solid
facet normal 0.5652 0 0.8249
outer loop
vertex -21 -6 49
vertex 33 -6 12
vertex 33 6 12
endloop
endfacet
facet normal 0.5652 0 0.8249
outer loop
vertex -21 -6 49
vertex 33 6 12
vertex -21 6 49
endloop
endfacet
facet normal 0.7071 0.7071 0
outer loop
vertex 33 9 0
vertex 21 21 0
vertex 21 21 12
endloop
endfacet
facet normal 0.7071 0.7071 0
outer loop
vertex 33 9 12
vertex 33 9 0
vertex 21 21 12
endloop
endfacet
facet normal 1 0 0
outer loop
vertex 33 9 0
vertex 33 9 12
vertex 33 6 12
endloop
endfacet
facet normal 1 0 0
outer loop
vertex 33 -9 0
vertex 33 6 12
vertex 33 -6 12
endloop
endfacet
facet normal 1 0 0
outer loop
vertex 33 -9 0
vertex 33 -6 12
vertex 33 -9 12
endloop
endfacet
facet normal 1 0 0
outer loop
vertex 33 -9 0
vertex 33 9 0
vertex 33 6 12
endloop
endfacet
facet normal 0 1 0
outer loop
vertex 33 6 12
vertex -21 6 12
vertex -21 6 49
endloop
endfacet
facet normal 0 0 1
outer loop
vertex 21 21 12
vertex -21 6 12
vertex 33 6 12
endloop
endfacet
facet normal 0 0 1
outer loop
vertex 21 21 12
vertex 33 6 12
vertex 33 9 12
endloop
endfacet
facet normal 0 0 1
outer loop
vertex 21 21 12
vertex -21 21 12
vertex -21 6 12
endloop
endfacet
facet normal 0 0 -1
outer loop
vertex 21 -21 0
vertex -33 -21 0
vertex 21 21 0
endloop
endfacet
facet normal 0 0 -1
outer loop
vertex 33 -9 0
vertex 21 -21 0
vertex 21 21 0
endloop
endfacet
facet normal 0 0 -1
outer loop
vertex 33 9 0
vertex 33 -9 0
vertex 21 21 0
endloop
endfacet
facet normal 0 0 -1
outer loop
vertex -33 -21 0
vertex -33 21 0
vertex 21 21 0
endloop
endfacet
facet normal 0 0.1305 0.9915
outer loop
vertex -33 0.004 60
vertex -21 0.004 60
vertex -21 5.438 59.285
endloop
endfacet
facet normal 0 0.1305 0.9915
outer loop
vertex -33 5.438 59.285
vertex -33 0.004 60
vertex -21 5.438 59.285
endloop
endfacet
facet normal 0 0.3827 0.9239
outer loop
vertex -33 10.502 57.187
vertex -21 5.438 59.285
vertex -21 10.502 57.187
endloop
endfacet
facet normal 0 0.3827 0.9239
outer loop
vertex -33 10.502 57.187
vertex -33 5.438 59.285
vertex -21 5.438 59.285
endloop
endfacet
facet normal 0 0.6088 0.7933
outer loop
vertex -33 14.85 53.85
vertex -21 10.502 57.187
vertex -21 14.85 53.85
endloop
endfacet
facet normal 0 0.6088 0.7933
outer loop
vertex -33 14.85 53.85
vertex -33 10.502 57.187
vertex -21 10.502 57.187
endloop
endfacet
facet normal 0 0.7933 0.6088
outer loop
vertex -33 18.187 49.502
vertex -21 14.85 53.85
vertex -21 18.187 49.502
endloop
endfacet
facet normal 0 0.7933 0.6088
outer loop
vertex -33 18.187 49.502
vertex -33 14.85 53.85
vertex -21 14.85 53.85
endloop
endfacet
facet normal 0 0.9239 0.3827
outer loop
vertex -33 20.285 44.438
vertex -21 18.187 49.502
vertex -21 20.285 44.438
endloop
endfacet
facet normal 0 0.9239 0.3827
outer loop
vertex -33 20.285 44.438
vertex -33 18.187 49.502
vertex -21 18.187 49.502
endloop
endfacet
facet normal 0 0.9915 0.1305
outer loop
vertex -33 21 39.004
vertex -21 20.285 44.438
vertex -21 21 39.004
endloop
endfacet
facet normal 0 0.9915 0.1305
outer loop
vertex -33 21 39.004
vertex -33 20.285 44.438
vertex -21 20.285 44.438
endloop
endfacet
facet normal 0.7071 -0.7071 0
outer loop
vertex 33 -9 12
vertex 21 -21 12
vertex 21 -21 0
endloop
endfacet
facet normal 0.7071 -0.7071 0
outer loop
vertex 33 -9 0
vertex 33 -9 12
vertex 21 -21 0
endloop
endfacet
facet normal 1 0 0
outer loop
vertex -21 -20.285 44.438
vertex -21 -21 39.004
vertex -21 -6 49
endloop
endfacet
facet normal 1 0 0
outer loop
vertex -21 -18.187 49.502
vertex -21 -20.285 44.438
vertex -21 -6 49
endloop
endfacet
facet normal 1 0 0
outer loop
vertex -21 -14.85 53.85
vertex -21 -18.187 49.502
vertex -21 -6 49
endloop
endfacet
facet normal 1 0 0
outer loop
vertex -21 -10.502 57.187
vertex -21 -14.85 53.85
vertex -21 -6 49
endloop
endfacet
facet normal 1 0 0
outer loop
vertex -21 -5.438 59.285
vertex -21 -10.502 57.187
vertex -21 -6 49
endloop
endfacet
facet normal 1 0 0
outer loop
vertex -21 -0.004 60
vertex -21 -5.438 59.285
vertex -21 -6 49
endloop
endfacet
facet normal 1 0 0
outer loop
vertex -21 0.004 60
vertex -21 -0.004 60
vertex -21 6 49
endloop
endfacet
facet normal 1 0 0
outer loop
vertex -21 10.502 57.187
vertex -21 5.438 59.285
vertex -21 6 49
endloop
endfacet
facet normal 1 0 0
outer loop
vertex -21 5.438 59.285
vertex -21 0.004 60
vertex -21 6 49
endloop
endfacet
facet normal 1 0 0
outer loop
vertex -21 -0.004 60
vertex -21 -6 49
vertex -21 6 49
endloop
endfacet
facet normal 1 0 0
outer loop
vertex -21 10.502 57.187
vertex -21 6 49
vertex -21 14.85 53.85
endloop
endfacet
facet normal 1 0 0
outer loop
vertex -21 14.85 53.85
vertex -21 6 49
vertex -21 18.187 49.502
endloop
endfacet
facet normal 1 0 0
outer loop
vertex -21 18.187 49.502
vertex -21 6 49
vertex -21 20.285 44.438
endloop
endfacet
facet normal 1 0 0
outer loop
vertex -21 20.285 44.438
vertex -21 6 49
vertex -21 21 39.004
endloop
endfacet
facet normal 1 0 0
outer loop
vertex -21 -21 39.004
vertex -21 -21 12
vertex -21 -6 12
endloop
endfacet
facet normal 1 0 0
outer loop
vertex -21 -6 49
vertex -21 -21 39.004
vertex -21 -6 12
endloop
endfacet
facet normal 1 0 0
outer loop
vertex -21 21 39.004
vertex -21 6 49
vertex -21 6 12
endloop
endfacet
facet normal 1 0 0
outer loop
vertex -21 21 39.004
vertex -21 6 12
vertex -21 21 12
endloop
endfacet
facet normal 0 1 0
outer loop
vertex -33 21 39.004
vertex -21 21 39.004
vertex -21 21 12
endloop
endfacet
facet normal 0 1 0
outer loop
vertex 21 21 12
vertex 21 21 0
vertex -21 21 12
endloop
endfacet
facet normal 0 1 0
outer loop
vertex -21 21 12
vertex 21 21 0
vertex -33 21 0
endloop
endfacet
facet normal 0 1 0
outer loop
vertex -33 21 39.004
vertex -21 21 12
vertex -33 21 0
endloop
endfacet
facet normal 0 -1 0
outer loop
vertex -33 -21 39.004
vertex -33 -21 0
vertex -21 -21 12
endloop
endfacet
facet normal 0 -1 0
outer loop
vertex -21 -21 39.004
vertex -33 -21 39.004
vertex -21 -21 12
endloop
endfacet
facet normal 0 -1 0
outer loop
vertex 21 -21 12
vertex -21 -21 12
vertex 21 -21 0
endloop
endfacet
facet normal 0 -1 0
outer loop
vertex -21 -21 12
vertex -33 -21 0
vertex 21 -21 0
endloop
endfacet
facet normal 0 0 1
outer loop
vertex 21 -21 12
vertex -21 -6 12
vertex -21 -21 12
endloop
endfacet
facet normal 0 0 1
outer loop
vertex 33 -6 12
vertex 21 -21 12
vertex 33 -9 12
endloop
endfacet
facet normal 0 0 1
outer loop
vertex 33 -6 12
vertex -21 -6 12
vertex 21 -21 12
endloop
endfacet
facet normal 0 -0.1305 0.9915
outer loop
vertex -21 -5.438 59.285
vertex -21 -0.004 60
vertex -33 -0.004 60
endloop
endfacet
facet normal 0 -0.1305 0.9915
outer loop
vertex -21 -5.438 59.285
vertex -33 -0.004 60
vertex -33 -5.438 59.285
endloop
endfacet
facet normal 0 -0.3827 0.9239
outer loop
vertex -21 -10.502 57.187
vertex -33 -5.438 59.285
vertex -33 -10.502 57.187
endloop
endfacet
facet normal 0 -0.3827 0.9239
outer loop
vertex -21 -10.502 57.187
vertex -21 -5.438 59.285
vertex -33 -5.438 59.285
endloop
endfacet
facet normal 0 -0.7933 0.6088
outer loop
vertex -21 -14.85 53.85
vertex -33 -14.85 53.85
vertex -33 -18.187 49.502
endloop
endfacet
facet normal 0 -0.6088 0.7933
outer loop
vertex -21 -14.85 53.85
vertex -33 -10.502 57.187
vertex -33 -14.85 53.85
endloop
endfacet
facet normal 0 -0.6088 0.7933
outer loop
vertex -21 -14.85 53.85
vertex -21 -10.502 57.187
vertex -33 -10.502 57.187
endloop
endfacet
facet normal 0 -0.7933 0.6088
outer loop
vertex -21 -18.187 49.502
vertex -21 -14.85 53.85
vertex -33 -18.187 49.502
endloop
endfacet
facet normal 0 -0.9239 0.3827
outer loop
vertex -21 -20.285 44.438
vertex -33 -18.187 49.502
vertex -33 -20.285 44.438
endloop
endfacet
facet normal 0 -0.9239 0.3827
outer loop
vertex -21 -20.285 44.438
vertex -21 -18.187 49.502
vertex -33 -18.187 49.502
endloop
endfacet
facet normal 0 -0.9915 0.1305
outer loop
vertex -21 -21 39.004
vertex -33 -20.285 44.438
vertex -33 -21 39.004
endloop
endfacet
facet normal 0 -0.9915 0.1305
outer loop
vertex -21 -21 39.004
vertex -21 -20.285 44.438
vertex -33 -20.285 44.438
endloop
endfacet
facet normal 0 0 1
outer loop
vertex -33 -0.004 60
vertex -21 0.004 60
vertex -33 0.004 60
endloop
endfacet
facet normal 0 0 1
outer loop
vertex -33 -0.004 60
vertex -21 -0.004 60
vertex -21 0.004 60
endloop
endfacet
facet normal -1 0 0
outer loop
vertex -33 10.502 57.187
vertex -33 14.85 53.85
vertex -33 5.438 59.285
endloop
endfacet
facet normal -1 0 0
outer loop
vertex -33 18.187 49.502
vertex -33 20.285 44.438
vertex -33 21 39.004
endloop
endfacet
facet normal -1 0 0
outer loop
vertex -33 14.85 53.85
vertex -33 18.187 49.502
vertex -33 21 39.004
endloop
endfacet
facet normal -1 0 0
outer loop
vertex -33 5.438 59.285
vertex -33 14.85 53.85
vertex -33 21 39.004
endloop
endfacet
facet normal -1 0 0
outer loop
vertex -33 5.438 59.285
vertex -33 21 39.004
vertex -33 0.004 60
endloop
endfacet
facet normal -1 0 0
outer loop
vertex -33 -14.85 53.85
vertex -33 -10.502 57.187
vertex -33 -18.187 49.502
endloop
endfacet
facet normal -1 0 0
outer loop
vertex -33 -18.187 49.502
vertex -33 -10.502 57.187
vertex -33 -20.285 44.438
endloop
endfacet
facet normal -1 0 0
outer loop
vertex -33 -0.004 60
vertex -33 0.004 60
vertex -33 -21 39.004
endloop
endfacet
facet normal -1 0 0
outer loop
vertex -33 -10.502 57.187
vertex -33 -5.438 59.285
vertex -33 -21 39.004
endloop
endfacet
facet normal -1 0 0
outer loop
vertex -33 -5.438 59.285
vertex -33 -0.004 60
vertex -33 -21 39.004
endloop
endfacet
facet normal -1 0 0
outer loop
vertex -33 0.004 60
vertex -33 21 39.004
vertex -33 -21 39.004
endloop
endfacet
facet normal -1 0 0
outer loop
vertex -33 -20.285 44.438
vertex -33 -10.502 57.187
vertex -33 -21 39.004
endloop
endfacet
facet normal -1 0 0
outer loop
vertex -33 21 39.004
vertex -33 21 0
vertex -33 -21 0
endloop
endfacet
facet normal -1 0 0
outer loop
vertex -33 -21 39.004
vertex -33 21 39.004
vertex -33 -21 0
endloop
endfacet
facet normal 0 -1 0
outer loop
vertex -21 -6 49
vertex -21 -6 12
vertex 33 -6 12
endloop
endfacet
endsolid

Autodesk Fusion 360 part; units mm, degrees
sketch "Sketch1" plane through (0, 0, 0) normal (0, 0, 1) x (1, 0, 0)
  line L0 (33, -21) -> (-33, -21)
  line L1 (-33, -21) -> (-33, 21)
  line L2 (-33, 21) -> (33, 21)
  line L3 (33, 21) -> (33, -21)
  line L4 (33, -21) -> (-33, 21) construction
  line L5 (-33, -21) -> (33, 21) construction
  dimension "d1" = 66
  dimension "d2" = 42
extrude "Extrude1" add sketch "Sketch1" along normal blind 12
chamfer "Chamfer1" distance 12 angle 45 2 edges at (33, -21, 6) (33, 21, 6)
sketch "Sketch2" plane through (0, 0, 12) normal (0, 0, 1) x (-1, 0, 0)
  line L0 (-33, -9) -> (-21, -21)
  line L1 (-21, -21) -> (33, -21)
  line L2 (33, -21) -> (33, 21)
  line L3 (33, 21) -> (-21, 21)
  line L4 (-21, 21) -> (-33, 9)
  line L5 (-33, 9) -> (-33, -9)
  line L6 (33, 21) -> (21, 21)
  line L7 (21, 21) -> (21, -21)
  line L8 (21, -21) -> (33, -21)
  line L9 (33, -21) -> (33, 21)
  dimension "d6" = 12
extrude "Extrude2" add sketch "Sketch2" along normal blind 48 contours L1 L2 L3 L6 L7 L8 L9
fillet "Fillet1" radius 21 2 edges at (-27, -21, 60) (-27, 21, 60)
sketch "Sketch6" plane through (0, 0, 0) normal (0, 1, 0) x (1, 0, 0)
  line L0 (-21, -49) -> (-21, -12)
  line L1 (-21, -12) -> (33, -12)
  line L2 (33, -12) -> (-21, -49)
  dimension "d11" = 37
extrude "Extrude3" add sketch "Sketch6" along normal mid plane 12
equation "d7 = 60 mm - 12 mm"
